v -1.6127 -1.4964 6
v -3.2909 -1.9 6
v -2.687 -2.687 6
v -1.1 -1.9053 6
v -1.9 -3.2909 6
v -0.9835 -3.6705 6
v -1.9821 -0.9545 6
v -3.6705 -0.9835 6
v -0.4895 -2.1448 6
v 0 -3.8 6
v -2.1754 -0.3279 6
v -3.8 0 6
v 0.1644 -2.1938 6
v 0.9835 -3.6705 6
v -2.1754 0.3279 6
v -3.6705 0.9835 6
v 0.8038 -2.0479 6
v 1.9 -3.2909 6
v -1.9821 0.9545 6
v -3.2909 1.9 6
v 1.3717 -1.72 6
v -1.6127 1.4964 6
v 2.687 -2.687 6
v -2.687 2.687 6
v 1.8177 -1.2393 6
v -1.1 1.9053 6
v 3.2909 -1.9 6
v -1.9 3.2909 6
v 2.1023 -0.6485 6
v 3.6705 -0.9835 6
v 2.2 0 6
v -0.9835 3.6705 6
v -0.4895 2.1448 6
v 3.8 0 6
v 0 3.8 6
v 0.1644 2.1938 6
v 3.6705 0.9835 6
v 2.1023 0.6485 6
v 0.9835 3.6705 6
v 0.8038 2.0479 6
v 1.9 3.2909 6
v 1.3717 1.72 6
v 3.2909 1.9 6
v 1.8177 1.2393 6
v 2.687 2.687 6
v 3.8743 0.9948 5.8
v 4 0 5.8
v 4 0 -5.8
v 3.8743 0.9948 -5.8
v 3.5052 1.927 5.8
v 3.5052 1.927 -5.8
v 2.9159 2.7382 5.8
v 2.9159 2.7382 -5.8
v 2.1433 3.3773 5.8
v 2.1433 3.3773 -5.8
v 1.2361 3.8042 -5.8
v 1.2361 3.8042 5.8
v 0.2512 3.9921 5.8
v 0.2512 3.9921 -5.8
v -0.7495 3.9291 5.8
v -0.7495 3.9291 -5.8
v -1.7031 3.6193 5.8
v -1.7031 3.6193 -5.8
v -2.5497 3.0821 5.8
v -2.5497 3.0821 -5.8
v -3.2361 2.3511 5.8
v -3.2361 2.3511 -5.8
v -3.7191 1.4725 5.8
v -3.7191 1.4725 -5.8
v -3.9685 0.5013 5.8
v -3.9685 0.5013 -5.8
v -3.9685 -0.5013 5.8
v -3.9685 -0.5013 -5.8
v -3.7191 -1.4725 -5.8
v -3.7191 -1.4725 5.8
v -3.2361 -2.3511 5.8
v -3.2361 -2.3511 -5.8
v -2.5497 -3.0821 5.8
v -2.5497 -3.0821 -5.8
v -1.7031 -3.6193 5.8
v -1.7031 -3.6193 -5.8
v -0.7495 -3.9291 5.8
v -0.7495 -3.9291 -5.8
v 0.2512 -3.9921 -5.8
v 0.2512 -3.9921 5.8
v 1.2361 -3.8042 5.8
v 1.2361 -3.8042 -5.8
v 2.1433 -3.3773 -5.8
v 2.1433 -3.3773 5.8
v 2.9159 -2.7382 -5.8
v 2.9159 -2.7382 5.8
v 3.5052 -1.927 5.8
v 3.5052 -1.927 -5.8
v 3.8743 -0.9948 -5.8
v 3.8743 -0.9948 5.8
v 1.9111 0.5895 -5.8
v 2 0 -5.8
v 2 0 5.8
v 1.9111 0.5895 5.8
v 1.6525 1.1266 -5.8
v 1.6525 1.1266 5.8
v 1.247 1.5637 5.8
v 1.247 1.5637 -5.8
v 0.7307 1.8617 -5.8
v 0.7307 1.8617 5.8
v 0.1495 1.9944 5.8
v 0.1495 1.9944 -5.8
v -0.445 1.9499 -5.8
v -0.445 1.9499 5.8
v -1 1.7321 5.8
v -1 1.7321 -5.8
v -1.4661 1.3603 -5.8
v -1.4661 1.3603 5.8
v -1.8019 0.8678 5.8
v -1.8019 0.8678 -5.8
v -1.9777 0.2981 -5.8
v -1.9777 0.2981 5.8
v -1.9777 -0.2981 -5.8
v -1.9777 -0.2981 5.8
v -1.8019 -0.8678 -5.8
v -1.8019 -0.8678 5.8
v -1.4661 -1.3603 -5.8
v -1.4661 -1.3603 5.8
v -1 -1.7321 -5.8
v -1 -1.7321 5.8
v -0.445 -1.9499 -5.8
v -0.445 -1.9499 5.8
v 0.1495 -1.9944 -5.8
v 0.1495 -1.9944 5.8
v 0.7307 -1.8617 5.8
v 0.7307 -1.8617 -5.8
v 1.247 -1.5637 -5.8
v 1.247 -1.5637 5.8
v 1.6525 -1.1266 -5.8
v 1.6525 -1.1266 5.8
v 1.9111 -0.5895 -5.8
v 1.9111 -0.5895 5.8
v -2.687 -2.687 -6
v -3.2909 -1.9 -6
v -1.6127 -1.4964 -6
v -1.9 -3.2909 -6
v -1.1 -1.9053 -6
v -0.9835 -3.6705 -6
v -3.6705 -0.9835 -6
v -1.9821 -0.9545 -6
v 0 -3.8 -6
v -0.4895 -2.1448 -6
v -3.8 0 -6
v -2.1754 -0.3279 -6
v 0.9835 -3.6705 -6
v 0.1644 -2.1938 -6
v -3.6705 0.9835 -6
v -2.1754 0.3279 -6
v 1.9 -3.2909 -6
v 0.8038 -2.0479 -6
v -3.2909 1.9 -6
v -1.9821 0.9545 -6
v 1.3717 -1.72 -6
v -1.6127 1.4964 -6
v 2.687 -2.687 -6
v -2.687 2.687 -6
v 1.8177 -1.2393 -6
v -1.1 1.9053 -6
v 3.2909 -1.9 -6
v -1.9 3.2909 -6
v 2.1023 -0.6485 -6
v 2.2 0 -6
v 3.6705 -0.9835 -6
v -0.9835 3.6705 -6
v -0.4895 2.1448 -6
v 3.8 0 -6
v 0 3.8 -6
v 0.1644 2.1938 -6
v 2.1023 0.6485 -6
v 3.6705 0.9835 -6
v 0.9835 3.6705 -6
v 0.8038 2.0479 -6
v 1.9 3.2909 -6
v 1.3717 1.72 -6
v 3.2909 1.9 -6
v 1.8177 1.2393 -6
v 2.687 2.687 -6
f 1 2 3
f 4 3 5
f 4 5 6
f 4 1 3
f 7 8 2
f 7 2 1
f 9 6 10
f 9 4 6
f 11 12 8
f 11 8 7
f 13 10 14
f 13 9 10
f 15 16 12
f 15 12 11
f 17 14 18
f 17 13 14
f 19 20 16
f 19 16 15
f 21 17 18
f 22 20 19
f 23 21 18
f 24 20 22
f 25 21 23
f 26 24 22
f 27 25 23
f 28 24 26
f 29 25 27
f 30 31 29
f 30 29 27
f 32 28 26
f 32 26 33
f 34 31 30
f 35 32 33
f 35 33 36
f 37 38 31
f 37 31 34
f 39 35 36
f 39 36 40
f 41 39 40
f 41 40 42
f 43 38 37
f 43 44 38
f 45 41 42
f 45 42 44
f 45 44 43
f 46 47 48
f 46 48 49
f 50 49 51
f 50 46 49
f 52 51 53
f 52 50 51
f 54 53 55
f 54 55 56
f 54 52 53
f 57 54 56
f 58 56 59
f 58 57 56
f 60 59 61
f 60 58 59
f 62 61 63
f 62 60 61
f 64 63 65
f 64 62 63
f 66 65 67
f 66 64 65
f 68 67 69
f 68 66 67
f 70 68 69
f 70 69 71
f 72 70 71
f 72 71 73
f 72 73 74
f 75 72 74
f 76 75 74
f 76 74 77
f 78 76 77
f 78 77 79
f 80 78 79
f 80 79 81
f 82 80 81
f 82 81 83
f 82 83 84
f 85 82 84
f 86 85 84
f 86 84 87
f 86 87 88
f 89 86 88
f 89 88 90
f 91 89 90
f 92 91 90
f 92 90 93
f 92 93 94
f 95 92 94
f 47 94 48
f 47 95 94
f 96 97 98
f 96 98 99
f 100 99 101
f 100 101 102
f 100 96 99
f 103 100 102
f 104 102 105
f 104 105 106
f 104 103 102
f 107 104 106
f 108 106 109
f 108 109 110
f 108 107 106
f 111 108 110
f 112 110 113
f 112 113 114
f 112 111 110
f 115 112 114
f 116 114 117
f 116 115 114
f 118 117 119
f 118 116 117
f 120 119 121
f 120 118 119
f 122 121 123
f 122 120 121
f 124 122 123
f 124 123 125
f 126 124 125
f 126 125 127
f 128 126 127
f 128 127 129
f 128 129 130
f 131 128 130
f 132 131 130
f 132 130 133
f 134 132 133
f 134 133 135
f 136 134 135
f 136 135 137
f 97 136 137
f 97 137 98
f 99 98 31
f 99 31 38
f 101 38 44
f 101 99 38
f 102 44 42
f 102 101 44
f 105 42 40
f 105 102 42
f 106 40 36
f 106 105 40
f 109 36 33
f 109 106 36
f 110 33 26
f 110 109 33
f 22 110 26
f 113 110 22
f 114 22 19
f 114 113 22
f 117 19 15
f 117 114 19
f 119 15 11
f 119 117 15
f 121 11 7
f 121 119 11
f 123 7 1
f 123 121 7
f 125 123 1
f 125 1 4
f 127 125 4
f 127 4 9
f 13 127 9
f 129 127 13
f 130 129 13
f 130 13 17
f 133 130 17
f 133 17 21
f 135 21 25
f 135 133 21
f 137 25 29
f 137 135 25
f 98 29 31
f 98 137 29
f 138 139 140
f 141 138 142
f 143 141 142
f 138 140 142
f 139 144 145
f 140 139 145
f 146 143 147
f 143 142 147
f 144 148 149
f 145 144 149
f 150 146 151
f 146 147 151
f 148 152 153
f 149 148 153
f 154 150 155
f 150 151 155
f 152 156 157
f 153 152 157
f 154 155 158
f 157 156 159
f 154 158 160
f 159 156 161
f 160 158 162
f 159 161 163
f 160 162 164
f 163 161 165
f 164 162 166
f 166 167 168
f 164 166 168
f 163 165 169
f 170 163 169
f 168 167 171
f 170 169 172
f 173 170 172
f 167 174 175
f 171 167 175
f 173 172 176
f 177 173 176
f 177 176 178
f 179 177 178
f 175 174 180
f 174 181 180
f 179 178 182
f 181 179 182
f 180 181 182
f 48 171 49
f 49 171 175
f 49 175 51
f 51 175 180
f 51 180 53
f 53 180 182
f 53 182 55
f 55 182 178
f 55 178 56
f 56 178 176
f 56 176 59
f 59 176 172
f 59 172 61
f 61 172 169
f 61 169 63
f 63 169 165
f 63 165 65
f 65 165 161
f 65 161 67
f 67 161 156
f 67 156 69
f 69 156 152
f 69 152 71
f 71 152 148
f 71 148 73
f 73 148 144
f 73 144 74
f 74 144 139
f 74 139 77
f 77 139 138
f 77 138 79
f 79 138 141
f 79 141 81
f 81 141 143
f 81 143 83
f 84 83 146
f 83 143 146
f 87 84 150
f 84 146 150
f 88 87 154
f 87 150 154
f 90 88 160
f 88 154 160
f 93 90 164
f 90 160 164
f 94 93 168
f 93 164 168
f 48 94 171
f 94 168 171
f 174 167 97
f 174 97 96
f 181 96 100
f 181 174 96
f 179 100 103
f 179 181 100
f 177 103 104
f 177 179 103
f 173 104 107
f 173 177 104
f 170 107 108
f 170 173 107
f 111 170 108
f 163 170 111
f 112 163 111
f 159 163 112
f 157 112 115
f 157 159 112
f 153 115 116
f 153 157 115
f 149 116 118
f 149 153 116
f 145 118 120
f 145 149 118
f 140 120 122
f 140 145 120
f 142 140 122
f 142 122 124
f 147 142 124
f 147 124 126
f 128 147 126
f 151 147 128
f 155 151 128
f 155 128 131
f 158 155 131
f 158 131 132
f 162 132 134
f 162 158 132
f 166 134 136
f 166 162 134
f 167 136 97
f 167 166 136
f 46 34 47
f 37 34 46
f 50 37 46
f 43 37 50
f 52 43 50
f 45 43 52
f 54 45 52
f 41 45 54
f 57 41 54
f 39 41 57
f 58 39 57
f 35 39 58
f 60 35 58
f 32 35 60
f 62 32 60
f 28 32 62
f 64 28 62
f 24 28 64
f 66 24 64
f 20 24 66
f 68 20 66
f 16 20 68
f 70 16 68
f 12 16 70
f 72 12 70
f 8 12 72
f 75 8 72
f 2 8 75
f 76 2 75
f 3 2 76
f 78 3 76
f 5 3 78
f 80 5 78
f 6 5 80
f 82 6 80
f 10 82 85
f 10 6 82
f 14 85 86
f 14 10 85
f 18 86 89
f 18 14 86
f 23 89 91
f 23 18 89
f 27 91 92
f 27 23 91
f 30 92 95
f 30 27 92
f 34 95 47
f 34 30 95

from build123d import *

# Parameters (mm, degrees)
SKETCH_2_R      = 4
SKETCH_2_R_2    = 2
EXTRUDE_1_DEPTH = 6
CHAMFER_1_SIZE  = 0.2


with BuildPart() as part:
    # 草图2 → 凸台-拉伸1 (new, symmetric)
    with BuildSketch(Plane.XY):
        Circle(SKETCH_2_R)
        Circle(SKETCH_2_R_2, mode=Mode.SUBTRACT)
    extrude(amount=EXTRUDE_1_DEPTH, both=True)

    # 倒角1
    chamfer_1_edges = [part.edges().sort_by_distance(p)[0] for p in [
        (-4, 0, -6),
        (-4, 0, 6),
        (-2, 0, -6),
        (-2, 0, 6),
    ]]
    chamfer(chamfer_1_edges, length=CHAMFER_1_SIZE)


solid = part.part
